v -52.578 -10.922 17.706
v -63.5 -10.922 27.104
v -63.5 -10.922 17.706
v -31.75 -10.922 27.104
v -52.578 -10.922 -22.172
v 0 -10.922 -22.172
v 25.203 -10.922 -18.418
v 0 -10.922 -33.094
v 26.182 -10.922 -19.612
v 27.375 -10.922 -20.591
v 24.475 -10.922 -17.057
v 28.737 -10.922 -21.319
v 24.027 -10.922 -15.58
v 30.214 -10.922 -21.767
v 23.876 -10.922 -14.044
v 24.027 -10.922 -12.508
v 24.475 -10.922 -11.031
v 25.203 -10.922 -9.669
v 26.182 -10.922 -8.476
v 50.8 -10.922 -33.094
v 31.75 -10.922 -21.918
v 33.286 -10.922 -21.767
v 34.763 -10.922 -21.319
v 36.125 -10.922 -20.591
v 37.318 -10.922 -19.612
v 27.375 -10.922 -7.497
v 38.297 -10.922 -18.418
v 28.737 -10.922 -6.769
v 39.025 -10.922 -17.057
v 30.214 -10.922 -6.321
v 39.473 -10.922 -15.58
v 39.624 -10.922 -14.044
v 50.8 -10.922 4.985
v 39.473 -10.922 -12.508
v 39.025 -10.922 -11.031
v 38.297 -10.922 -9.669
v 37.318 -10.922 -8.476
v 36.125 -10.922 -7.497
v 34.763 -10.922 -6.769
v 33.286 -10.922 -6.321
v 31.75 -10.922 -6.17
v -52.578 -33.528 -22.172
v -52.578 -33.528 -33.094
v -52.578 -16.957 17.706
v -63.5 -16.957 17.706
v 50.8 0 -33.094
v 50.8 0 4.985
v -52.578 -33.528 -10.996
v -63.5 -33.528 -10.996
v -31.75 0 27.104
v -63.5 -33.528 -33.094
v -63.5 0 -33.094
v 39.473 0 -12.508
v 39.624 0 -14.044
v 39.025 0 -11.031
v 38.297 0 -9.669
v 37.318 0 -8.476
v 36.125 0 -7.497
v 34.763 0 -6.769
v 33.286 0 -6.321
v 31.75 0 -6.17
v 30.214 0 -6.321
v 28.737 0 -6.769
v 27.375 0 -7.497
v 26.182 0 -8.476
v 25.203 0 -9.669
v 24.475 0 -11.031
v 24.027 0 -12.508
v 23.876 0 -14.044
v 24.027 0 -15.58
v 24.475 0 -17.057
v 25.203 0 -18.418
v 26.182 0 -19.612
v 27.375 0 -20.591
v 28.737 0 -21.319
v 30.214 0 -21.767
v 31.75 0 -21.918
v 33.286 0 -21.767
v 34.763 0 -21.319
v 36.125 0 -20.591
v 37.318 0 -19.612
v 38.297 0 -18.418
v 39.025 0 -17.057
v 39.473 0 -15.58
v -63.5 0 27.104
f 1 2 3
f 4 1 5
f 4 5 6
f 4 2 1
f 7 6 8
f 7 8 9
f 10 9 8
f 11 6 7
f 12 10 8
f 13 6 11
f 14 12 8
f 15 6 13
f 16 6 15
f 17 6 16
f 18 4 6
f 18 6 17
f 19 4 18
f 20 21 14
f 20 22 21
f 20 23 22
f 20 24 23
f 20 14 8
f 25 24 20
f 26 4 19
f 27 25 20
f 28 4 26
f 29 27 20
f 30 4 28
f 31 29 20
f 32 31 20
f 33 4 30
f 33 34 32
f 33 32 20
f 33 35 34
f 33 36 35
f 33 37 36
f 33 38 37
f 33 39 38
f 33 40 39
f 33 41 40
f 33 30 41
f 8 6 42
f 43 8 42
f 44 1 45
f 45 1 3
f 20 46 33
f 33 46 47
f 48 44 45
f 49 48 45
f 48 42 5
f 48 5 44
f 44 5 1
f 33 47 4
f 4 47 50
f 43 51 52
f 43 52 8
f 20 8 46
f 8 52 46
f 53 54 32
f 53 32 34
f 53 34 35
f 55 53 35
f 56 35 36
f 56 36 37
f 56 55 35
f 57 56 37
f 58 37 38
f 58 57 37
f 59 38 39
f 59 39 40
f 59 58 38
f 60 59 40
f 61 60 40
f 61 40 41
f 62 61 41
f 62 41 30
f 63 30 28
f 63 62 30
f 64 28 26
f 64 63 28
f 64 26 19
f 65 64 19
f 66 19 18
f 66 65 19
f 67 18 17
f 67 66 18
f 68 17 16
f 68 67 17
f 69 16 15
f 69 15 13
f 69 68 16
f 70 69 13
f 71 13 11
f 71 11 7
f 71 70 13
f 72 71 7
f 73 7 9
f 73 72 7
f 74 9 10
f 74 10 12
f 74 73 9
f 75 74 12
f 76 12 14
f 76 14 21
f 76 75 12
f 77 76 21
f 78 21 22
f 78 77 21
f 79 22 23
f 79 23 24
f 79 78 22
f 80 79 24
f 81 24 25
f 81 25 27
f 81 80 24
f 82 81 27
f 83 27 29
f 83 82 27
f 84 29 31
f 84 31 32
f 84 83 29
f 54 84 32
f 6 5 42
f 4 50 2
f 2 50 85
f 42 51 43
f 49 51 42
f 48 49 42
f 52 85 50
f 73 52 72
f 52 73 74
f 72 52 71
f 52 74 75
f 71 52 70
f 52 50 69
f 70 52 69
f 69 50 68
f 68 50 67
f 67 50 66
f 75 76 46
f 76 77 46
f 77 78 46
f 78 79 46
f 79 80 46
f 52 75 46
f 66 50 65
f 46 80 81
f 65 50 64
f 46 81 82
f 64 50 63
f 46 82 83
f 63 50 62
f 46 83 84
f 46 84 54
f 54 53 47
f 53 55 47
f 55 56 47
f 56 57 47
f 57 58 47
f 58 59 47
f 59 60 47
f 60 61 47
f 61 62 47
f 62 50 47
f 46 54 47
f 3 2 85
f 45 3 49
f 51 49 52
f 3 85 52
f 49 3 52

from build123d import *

# Parameters (mm, degrees)
F0_R     = 7.874
F1_DEPTH = 10.922
F0_W     = 52.578
F0_H     = 10.922
F2_DEPTH = 33.528
F3_SIZE2 = 16.571107
F3_SIZE  = 28.702
F5_DEPTH = 25.4


with BuildPart() as f1:
    # F0 (on Front) → F1 (new body)
    with BuildSketch(Plane.XZ):
        Polygon((-63.5, 27.104102), (-63.5, 17.706102), (-52.578, 17.706102), (-52.578, -22.171898), (0, -22.171898), (0, -33.093898), (50.8, -33.093898), (50.8, 4.984896), (-31.75, 27.104102), align=None)
        with Locations((31.75, -14.043898)):
            Circle(F0_R, mode=Mode.SUBTRACT)
    extrude(amount=F1_DEPTH)

    # F0 (on Front) → F2 (join)
    with BuildSketch(Plane.XZ):
        Polygon((-63.5, 17.706102), (-63.5, -33.093898), (-52.578, -33.093898), (-52.578, -22.171898), (-52.578, 17.706102), align=None)
        with Locations((-26.289, -27.632898)):
            Rectangle(F0_W, F0_H)
    extrude(amount=F2_DEPTH)

    # F3
    f3_edges = [f1.edges().sort_by_distance(p)[0] for p in [
        (-58.039, -33.528, 17.706102),
    ]]
    chamfer(f3_edges, length=F3_SIZE, length2=F3_SIZE2)

    # F4 (on face) → F5 (cut)
    with BuildSketch(Plane.XY.offset(-22.171898)):
        Polygon((0, -10.922), (-52.578, -33.528), (0, -33.528), align=None)
    extrude(amount=-F5_DEPTH, mode=Mode.SUBTRACT)


solid = f1.part
